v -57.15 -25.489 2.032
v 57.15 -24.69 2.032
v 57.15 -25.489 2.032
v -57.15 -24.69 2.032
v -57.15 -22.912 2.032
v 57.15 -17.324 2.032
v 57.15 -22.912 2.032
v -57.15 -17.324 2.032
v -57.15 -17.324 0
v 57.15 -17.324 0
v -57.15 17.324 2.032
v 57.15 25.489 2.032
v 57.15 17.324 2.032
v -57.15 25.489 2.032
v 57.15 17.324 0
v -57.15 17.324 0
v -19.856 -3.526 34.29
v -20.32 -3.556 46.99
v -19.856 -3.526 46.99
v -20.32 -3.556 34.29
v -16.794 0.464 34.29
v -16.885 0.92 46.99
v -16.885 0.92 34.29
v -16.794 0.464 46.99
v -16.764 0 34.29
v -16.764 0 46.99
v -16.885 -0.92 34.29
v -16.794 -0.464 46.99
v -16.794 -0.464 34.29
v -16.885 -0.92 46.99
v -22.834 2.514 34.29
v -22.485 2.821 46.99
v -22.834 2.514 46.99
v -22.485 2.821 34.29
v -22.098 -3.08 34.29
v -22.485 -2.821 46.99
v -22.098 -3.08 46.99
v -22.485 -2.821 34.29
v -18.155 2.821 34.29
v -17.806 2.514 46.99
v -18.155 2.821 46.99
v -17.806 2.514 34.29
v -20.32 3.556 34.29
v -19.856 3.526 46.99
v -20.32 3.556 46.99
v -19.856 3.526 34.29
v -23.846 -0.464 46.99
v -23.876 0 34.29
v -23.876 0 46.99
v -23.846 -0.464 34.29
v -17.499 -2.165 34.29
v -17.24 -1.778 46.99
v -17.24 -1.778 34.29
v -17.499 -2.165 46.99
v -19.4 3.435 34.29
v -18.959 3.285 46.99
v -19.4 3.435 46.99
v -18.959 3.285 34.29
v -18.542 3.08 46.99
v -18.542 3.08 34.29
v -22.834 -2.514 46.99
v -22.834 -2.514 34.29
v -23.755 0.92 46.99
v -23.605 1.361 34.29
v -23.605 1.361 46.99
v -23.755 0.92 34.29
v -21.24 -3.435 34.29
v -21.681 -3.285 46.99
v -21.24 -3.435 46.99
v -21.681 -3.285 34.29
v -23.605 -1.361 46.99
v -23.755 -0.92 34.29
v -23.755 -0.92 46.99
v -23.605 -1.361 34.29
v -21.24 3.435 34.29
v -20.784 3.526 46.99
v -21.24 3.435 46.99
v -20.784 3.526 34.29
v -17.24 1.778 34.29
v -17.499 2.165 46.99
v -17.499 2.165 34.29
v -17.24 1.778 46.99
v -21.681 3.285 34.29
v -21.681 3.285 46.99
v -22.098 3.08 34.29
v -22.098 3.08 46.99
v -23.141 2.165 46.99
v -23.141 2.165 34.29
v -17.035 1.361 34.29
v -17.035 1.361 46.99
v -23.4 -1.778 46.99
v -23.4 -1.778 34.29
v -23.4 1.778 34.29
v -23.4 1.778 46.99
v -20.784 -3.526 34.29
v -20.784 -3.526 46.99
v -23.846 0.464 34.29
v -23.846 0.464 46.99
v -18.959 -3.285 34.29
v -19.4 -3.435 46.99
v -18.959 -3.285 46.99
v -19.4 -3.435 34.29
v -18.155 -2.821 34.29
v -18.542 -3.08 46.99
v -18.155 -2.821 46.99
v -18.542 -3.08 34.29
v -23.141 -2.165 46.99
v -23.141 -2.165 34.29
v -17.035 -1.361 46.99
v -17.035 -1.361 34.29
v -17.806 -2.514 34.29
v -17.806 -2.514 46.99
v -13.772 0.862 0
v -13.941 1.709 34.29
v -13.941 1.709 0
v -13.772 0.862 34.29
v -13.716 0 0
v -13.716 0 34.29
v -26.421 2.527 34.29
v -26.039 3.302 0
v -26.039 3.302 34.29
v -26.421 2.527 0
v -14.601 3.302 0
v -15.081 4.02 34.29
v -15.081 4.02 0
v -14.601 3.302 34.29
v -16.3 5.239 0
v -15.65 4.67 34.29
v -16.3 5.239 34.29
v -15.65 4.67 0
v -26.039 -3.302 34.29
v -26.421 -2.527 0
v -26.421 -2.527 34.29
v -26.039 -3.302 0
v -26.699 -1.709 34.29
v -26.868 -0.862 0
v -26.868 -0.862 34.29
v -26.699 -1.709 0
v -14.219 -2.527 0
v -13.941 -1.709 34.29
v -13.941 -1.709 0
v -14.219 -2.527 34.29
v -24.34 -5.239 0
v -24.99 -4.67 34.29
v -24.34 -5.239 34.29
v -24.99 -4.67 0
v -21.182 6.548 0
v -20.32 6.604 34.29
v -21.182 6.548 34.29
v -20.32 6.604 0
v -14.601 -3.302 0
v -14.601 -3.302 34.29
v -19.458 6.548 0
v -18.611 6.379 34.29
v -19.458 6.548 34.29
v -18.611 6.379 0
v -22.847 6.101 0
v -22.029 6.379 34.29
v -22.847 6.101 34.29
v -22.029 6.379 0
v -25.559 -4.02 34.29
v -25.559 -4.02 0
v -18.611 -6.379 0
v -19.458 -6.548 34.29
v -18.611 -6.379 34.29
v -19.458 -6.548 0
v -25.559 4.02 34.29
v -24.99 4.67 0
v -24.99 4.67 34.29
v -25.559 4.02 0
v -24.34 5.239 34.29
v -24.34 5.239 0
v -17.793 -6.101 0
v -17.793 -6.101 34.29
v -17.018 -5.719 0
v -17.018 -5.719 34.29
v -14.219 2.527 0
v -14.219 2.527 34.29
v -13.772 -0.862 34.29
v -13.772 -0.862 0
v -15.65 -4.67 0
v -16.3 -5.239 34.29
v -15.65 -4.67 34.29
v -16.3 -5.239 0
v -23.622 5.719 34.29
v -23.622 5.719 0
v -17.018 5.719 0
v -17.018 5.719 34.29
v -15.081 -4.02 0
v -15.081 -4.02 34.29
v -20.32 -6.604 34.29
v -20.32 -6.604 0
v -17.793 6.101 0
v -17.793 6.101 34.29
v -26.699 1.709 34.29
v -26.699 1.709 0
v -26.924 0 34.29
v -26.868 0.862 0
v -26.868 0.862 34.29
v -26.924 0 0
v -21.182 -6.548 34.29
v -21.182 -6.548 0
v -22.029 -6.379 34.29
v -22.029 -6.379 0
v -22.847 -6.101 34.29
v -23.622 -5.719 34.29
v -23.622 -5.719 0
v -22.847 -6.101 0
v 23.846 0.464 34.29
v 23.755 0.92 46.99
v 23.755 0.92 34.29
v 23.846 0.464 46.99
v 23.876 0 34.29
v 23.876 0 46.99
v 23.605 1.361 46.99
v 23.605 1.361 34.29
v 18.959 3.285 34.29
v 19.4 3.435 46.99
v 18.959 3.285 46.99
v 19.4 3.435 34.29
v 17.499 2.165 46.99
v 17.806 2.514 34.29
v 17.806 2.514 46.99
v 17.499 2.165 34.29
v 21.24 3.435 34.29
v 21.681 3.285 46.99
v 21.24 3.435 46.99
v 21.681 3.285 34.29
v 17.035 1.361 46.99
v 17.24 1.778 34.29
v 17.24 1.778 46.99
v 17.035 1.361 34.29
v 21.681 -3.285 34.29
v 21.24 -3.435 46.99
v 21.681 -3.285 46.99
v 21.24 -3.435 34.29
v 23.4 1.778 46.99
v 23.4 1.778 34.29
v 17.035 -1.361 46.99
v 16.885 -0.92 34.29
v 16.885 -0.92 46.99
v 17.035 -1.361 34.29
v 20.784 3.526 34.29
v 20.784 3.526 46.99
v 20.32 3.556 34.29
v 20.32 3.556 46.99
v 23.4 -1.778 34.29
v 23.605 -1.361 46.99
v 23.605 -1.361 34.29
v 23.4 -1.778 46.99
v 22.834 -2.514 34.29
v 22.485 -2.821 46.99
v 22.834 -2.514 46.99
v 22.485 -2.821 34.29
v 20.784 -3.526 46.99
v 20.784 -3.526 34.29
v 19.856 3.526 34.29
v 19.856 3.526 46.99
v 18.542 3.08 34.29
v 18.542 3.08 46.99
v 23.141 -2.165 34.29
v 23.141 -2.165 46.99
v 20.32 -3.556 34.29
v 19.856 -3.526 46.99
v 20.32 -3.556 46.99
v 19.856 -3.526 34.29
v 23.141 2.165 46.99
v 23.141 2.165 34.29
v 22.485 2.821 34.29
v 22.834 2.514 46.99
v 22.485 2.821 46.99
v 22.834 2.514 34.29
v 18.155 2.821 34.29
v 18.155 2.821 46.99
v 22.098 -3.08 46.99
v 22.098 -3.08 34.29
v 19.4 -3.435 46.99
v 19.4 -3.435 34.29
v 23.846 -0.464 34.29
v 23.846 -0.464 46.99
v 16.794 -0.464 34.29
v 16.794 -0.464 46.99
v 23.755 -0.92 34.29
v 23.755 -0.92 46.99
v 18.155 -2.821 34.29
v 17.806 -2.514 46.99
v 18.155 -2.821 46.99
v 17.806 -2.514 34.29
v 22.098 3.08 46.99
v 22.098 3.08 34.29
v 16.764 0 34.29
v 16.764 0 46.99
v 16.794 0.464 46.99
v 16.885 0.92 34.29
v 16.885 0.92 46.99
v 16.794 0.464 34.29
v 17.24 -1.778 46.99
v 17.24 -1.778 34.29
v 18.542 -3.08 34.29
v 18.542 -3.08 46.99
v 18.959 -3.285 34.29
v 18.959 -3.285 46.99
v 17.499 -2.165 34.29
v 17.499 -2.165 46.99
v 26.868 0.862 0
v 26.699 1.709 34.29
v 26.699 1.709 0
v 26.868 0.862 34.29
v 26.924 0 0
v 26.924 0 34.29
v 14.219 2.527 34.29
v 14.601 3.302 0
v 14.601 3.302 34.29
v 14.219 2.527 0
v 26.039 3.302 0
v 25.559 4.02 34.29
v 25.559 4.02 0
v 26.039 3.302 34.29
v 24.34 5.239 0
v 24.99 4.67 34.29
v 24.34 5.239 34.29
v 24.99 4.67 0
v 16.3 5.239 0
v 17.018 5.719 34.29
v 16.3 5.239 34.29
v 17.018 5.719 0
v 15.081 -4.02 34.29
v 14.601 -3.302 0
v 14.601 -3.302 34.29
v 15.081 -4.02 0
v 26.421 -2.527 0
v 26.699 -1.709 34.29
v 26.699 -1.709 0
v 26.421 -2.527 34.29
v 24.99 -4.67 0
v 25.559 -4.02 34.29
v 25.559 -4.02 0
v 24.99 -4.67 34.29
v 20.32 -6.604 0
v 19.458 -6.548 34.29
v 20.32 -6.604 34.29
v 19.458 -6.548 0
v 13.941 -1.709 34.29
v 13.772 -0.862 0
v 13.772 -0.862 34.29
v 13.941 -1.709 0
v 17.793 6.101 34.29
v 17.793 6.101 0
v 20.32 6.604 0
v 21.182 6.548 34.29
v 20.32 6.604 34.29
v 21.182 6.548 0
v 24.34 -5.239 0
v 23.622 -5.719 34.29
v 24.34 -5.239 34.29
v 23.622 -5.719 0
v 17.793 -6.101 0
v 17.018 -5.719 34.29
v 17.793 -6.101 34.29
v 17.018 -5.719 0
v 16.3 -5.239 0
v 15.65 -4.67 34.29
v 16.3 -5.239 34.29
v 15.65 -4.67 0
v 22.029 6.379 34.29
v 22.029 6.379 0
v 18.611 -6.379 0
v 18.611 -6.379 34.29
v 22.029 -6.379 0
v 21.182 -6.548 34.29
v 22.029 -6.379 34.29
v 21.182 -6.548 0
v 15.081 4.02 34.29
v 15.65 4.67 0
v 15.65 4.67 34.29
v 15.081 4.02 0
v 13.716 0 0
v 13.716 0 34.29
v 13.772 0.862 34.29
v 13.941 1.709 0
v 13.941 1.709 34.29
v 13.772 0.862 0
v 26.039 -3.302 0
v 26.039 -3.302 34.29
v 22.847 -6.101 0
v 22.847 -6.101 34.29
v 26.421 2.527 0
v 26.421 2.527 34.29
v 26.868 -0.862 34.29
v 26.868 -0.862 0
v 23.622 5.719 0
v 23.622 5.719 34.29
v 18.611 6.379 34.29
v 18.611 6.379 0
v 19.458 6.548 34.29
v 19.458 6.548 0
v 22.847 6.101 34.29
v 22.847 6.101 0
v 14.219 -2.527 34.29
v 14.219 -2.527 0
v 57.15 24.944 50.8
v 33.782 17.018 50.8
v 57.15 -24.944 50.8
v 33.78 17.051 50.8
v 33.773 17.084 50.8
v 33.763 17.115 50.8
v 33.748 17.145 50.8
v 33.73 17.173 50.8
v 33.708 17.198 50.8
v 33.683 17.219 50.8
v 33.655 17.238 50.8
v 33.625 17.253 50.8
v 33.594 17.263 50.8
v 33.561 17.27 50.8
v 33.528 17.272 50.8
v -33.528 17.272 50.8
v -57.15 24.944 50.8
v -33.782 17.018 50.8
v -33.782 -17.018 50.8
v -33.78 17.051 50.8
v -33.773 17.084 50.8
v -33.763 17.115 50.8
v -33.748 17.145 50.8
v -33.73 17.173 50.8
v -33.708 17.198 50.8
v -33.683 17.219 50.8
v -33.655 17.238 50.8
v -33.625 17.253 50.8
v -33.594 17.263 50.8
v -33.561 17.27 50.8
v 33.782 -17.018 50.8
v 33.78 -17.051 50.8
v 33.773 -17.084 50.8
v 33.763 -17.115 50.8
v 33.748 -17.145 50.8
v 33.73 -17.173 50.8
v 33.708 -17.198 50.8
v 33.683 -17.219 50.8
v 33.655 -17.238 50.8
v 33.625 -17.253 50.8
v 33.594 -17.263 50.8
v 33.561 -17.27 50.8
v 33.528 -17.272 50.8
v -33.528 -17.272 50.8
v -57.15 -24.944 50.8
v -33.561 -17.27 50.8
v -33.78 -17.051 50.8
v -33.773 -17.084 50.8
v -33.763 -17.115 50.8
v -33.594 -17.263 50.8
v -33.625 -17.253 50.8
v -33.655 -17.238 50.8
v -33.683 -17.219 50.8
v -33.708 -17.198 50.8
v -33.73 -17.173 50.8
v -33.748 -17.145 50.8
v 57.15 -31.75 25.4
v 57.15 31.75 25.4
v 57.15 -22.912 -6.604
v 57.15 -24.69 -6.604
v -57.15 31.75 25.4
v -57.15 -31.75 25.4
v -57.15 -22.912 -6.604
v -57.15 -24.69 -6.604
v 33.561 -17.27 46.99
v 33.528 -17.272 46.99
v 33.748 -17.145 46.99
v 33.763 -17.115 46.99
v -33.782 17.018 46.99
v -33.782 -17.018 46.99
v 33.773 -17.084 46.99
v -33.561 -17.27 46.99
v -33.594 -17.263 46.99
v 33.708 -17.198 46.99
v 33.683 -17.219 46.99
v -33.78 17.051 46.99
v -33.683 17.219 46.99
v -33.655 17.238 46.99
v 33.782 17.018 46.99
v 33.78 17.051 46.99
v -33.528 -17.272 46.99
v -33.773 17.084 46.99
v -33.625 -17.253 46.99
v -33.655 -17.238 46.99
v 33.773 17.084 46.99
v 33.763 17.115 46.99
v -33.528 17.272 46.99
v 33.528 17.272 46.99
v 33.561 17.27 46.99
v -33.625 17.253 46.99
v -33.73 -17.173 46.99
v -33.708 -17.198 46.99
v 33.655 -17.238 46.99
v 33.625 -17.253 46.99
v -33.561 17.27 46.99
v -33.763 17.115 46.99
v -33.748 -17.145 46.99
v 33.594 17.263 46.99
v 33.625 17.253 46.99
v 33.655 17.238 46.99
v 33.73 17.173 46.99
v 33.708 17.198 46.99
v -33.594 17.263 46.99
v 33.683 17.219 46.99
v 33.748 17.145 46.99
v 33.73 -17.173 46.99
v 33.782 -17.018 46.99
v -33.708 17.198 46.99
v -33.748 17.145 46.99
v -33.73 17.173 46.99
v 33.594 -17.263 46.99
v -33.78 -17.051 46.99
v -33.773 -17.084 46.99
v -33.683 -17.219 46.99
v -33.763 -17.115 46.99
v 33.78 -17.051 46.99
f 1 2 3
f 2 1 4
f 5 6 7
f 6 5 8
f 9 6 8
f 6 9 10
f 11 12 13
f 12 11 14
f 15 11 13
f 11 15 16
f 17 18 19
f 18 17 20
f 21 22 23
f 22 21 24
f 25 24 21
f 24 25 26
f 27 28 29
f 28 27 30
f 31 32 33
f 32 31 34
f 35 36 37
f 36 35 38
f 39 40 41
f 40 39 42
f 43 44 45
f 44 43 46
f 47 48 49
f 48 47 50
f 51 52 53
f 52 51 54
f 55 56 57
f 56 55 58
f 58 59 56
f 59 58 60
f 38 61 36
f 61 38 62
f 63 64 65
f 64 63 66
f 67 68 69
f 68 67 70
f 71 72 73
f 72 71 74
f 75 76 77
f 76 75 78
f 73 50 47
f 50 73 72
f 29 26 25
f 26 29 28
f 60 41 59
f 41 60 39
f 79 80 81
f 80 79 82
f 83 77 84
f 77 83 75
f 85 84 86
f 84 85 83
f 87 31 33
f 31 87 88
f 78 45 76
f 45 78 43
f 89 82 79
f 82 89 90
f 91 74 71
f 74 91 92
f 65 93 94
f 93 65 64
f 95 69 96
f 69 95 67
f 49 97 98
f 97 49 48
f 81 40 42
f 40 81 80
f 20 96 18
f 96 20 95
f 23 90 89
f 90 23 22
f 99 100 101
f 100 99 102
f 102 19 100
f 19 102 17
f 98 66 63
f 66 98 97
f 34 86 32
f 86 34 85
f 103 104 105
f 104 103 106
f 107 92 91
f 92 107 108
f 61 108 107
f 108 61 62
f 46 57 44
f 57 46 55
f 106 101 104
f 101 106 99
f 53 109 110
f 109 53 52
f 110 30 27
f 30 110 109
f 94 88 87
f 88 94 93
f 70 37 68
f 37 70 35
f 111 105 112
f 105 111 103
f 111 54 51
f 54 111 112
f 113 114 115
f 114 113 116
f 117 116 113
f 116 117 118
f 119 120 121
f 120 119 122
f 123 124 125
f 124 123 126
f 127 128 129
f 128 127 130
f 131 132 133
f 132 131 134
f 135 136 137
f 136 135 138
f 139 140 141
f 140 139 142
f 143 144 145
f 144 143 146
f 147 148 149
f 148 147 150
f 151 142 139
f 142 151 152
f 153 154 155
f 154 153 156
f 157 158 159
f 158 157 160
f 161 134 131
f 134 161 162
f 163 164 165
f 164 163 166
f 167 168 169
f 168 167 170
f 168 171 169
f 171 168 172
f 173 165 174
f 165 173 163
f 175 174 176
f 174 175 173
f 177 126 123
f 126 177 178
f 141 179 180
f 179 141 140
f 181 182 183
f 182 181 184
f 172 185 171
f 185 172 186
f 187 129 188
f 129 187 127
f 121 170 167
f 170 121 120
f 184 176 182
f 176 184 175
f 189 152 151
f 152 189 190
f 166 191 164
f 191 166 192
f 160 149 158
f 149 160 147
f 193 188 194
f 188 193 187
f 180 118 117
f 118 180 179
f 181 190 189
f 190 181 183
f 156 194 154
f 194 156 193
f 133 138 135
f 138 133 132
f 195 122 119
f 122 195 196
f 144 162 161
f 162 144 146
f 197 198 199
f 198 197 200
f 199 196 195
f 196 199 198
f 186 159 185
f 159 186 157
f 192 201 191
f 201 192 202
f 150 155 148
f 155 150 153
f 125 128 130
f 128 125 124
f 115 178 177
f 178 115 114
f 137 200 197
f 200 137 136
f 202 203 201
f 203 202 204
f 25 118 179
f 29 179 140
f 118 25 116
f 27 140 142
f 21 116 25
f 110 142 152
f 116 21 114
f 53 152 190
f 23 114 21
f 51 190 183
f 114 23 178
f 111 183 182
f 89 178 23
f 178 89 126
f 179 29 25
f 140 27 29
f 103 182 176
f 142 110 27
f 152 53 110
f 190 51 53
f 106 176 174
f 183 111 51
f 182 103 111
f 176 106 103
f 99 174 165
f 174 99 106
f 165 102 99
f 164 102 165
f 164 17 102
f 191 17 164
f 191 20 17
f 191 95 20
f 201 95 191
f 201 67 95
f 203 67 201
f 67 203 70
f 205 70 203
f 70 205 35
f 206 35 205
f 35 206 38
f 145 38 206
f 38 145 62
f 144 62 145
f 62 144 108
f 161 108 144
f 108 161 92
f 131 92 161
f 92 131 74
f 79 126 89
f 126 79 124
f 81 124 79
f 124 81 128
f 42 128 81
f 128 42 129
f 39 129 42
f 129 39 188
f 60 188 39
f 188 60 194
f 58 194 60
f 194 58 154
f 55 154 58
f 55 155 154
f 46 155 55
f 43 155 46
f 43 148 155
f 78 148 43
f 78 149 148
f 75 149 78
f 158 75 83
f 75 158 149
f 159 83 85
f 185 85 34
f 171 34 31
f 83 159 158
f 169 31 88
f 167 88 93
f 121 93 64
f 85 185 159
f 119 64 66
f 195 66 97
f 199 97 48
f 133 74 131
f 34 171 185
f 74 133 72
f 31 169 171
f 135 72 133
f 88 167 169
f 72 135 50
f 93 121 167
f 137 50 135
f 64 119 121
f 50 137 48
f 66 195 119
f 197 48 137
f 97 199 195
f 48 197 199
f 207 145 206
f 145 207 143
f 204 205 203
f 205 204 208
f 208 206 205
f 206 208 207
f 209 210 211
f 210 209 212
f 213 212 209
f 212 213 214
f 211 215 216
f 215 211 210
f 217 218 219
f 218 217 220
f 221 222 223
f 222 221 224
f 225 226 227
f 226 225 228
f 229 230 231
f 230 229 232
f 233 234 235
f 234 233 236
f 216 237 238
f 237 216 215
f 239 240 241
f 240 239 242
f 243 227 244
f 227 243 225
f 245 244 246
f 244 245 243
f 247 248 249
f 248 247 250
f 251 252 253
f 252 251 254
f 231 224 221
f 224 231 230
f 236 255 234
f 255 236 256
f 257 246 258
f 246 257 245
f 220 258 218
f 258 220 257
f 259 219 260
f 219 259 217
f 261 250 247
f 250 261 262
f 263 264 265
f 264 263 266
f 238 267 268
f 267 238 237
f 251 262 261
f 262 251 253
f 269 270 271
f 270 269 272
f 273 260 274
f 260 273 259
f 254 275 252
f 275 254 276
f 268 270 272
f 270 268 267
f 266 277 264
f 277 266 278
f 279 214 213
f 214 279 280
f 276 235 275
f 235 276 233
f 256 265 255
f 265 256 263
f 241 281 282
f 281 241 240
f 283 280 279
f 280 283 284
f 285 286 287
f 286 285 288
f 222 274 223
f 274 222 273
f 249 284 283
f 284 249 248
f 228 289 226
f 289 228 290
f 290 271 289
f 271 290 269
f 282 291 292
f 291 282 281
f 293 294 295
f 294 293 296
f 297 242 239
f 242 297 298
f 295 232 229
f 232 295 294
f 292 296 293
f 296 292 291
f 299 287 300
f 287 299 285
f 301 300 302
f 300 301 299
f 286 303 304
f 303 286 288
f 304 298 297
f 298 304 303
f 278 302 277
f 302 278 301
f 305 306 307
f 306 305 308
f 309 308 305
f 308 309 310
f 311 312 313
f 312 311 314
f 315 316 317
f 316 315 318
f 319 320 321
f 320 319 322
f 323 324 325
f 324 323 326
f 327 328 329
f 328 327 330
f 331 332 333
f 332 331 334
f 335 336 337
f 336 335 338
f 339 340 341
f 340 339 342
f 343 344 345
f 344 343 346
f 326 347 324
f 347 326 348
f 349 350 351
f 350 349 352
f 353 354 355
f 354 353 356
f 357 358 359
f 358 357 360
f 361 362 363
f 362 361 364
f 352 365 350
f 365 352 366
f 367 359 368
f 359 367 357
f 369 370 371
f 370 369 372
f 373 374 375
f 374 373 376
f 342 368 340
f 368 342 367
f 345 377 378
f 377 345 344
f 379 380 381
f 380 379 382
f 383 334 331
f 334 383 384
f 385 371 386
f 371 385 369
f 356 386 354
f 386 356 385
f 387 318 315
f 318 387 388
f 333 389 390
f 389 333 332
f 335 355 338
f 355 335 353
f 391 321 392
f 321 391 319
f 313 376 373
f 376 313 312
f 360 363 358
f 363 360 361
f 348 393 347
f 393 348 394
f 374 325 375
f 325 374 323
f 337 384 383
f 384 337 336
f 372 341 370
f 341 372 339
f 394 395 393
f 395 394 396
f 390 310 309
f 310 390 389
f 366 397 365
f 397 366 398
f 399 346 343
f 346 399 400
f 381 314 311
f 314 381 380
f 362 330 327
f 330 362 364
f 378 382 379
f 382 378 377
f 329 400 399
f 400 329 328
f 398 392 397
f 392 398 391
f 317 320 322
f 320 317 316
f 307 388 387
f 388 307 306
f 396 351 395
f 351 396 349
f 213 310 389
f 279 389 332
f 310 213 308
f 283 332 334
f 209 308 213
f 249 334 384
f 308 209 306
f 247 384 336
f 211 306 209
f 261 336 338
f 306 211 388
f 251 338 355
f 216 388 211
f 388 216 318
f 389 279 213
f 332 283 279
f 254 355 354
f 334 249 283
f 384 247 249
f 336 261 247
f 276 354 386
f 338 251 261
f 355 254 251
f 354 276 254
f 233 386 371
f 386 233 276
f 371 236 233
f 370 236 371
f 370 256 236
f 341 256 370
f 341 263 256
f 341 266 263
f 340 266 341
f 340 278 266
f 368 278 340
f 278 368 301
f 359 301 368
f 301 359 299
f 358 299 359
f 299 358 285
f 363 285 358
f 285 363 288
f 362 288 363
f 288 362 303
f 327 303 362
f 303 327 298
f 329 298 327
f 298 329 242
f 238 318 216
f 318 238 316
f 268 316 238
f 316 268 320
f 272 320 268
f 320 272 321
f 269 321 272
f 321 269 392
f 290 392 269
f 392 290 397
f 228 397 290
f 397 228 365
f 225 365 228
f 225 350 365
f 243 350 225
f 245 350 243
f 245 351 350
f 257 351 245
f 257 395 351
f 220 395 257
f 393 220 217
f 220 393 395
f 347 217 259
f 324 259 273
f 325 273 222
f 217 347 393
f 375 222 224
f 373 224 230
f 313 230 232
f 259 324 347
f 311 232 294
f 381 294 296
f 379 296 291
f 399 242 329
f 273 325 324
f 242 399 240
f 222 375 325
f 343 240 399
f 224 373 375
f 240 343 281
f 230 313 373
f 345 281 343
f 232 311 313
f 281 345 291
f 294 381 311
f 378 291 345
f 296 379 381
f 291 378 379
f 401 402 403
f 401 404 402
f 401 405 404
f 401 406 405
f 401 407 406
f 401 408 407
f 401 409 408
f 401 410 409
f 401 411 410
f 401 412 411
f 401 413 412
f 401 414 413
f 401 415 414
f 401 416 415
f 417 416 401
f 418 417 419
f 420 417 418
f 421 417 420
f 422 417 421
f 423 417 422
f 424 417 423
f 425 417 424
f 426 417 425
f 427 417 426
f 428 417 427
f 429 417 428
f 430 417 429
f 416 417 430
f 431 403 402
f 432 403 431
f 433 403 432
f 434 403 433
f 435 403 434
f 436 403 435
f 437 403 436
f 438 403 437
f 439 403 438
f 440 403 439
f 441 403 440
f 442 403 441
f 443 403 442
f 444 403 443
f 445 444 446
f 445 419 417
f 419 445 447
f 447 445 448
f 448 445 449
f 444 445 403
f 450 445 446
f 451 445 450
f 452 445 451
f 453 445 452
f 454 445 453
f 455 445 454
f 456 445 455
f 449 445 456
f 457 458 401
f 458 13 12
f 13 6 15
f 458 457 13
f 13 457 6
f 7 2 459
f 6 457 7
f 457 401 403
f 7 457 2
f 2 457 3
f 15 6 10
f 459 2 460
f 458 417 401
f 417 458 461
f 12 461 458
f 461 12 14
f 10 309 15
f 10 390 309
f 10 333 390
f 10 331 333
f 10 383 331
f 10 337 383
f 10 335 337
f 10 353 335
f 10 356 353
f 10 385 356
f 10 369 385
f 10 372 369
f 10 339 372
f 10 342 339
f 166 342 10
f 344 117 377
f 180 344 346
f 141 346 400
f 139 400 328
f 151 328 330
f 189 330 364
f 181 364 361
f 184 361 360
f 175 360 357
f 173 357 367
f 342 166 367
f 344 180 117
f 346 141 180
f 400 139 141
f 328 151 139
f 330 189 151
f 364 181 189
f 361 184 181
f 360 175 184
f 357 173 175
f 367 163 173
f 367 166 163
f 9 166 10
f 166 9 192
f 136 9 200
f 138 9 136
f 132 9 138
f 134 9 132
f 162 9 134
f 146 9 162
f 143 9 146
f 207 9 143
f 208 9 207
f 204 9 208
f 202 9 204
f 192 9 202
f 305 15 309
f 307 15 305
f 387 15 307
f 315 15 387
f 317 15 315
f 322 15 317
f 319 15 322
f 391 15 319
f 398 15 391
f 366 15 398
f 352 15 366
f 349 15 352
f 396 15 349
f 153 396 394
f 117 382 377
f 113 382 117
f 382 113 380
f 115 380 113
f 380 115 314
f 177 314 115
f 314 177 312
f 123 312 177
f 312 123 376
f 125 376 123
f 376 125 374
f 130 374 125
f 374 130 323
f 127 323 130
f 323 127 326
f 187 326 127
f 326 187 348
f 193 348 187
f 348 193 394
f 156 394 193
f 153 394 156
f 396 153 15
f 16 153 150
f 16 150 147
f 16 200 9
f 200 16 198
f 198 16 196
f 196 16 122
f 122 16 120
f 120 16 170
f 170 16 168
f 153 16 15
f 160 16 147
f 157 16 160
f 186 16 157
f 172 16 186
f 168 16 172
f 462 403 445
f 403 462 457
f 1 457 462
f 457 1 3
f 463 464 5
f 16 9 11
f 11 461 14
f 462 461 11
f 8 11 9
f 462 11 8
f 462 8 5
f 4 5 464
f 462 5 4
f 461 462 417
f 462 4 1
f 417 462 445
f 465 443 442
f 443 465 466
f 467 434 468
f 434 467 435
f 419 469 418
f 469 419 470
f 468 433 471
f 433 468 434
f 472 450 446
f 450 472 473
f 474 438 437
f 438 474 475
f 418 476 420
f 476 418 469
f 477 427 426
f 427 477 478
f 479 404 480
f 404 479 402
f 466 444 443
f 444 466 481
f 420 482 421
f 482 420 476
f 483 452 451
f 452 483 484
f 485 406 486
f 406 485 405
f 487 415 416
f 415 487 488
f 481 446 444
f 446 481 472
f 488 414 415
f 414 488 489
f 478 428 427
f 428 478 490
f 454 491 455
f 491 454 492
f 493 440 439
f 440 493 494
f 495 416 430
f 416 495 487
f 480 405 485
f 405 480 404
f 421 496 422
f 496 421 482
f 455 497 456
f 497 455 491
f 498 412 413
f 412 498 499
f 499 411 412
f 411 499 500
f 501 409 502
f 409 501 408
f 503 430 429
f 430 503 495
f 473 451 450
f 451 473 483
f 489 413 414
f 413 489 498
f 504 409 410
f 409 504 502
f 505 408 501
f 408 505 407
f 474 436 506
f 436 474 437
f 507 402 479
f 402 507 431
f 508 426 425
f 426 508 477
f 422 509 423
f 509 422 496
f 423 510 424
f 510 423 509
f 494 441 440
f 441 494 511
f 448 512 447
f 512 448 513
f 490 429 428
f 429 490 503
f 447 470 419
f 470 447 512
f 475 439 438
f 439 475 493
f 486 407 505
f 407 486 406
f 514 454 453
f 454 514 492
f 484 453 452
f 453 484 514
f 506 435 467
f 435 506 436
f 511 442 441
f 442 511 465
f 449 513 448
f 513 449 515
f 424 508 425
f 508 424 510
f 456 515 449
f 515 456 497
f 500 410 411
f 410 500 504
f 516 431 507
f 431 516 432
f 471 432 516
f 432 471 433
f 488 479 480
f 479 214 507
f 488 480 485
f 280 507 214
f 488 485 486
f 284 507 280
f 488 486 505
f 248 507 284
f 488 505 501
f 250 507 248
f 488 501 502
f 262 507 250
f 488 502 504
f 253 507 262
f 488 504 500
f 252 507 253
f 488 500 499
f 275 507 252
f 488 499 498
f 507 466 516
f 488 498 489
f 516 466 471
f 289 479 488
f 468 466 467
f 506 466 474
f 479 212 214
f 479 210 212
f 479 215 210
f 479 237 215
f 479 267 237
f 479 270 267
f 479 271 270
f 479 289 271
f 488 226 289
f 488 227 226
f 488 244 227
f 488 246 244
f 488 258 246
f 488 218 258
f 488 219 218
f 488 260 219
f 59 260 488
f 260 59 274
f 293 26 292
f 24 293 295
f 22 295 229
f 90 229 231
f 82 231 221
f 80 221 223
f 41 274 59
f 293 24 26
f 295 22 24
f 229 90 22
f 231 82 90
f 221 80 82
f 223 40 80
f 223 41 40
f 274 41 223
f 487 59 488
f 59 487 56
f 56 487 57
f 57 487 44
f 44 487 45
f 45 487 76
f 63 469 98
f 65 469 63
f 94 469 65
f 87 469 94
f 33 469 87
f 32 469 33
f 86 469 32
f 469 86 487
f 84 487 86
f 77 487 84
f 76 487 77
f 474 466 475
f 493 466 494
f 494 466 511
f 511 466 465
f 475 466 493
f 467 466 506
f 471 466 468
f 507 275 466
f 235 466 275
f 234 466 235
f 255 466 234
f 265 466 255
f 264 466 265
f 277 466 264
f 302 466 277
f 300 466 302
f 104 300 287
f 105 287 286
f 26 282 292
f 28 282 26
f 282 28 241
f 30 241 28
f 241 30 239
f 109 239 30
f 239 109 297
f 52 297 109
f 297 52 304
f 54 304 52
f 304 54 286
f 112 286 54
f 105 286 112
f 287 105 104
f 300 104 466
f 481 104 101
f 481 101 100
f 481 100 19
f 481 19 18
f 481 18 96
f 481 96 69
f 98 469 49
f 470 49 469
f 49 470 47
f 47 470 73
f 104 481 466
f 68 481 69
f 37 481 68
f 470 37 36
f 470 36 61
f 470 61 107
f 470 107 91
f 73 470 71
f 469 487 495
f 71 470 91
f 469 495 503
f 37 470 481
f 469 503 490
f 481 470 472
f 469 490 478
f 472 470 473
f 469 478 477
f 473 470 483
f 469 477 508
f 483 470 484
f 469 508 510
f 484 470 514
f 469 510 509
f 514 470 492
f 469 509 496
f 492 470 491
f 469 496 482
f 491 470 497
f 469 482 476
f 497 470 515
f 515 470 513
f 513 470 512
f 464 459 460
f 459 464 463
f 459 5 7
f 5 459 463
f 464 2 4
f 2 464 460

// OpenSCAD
// Keel dock for the Doyle light-vee jaws — Rev H (v8): the set-tab is now unioned AFTER the rail reliefs and reaches up through
// the relief into the keel web. In Rev D..G the relief was cut through the tab's root, leaving the tab a separate floating body
// (caught in the slicer, never printed). Rev G = Rev F on 1/4-20 hardware: 9/32 holes, 1/4-20 x 1-1/4 button heads, no washer; PRINT ON END
// A double-vee keel that is the negative of the jaw vee (15deg faces, 1.00" above and below the apex),
// so it drops between the jaws, self-centers when clamped, and carries a swappable top (mag insert etc.).
// Two 1/4-20 x 1-1/4 button heads come UP through counterbores in the keel bottom, into 1/4-20 nuts dropped down hex
// pockets inside the mag stub; the nuts bear on the insert base, so base + keel web are clamped.
// Print upright (as modeled): bottom on the bed, no supports.  Units: parameters in inches, model in mm.

in = 25.4;

/* [Keel] */
keel_length_in     = 4.50;   // = the plate seat width: clamps right over the casting, no wing loading
keel_apex_width_in = 2.50;   // jaw-apex to jaw-apex when clamped (max opening at apex is 3.00")
face_angle_deg     = 15;     // must match the jaws
vee_half_height_in = 1.00;   // must match the jaws (keel is 2x this tall)
end_stops          = false;   // plates at both ends that bracket the jaw ends so the keel can't walk
stop_thick_in      = 0.20;
stop_gap_in        = 0.03;   // clearance to the jaw end faces
stop_overlap_in    = 0.50;   // how far the stops reach onto the jaw ends, each side

/* [Set tab — a fin on one side that drops into the jaw's foam-lip groove so you can set the keel on the
   fixed jaw and then tighten. Fits deep: keel sits tab_lift low until the closing vee faces lift it. */
set_tab            = true;
tab_length_in      = 4.50;   // full keel length
tab_thick_in       = 0.07;   // Rev I jaw slot is 0.10"
tab_clear_in       = 0.01;   // gap to the jaw face
tab_depth_in       = 0.26;   // below the keel bottom (groove is 0.30" deep -> 0.04" of lift before it bottoms)
rail_relief_in     = 0.08;   // relief over the foam-lip rails on both bottom edges so they never carry the keel
rail_relief_wid_in = 0.30;   // from the bottom corner inward (Rev I lip reaches 0.245" in from the vee edge)
print_on_end       = false;  // true = stand on an end face for printing (tab, pocket, reliefs all become vertical walls)

/* [Top-piece interface — Rev B: two M6 x 30 from the TOP through ears on the insert base,
   into M6 nuts in side-entry slots in the keel (nut bears UP on keel material, so the joint actually clamps) */
pocket_len_in      = 2.64;   // insert base footprint (matches the PMAG block tang: 2.64" x 1.34")
pocket_wid_in      = 1.34;
pocket_depth_in    = 0.15;
pocket_clear_in    = 0.01;
bolt_cc_in         = 1.60;   // bolt center-to-center (inside the stub footprint, +/-0.80")
bolt_dia_in        = 0.28;   // 9/32 clearance for 1/4-20
head_cbore_in      = 0.52;   // Ø for a 1/4-20 button head (0.44 dia), from the bottom — no washer, the keel bottom is only 1.96 wide
keel_under_bolt_in = 0.50;   // solid keel web between the head and the pocket floor: 0.50 + 0.40 base + 0.22 nut = 1.12" < 1-1/4 screw

$fn = 48;

L   = keel_length_in * in;
W   = keel_apex_width_in * in;
VH  = vee_half_height_in * in;
DEP = VH * tan(face_angle_deg);
KH  = 2 * VH;                      // keel height
WT  = W - 2 * DEP;                 // width at top and bottom
ST  = stop_thick_in * in; SG = stop_gap_in * in; SO = stop_overlap_in * in;

echo(str("keel ", L/in, " x ", W/in, " (apex) / ", WT/in, " (top,bottom) x ", KH/in, " tall; total length with stops = ", (L + 2*(SG+ST))/in));

module keel_profile() {   // in (Y, Z): hexagon, apex at Z = VH
    polygon([[-WT/2, 0], [WT/2, 0], [W/2, VH], [WT/2, KH], [-WT/2, KH], [-W/2, VH]]);
}

TL = tab_length_in * in; TT = tab_thick_in * in; TC = tab_clear_in * in; TD = tab_depth_in * in;
RR = rail_relief_in * in; RW = rail_relief_wid_in * in;

module keel() {
    union() {
        difference() {
            union() {
                rotate([90, 0, 90]) translate([0, 0, -L/2]) linear_extrude(L) keel_profile();
                if (end_stops)
                    for (s = [-1, 1])
                        translate([s * (L/2 + SG + ST/2), 0, KH/2])
                            cube([ST, WT + 2 * SO, KH], center = true);
            }
            // relief over the foam-lip rails, both bottom edges (keel must hang on the vee faces, not the rails)
            if (set_tab)
                for (sy = [-1, 1])
                    translate([-L/2 - 1, sy > 0 ? WT/2 - RW : -WT/2 - 1, -1]) cube([L + 2, RW + 1, RR + 1]);
            // pocket for the top piece
            translate([0, 0, KH - pocket_depth_in * in])
                linear_extrude(pocket_depth_in * in + 1)
                    offset(r = pocket_clear_in * in) square([pocket_len_in * in, pocket_wid_in * in], center = true);
            // two bolts from below: clearance hole + deep counterbore for the head (4 mm T-handle reaches)
            for (s = [-1, 1]) {
                bx = s * bolt_cc_in * in / 2;
                translate([bx, 0, -1]) cylinder(d = bolt_dia_in * in, h = KH + 2);
                translate([bx, 0, -1]) cylinder(d = head_cbore_in * in, h = KH - pocket_depth_in * in - keel_under_bolt_in * in + 1);
            }
        }
        // set-tab: fin hanging below the bottom on the -Y side, sitting in the jaw's foam slot (slot is against the vee-face
        // plane, lip is 0.10" further in, so the fin at 0.01-0.08" from the edge clears the lip). Added AFTER the relief and
        // carried 1 mm up past it into the web, so it is one body with the keel. Above the vee edge it stands in open air.
        if (set_tab)
            translate([-TL/2, -(WT/2 - TC), -TD]) cube([TL, TT, TD + RR + 1]);
    }
}

if (print_on_end) translate([0, 0, L/2]) rotate([0, -90, 0]) keel(); else keel();   // pop can: stands on an end face
